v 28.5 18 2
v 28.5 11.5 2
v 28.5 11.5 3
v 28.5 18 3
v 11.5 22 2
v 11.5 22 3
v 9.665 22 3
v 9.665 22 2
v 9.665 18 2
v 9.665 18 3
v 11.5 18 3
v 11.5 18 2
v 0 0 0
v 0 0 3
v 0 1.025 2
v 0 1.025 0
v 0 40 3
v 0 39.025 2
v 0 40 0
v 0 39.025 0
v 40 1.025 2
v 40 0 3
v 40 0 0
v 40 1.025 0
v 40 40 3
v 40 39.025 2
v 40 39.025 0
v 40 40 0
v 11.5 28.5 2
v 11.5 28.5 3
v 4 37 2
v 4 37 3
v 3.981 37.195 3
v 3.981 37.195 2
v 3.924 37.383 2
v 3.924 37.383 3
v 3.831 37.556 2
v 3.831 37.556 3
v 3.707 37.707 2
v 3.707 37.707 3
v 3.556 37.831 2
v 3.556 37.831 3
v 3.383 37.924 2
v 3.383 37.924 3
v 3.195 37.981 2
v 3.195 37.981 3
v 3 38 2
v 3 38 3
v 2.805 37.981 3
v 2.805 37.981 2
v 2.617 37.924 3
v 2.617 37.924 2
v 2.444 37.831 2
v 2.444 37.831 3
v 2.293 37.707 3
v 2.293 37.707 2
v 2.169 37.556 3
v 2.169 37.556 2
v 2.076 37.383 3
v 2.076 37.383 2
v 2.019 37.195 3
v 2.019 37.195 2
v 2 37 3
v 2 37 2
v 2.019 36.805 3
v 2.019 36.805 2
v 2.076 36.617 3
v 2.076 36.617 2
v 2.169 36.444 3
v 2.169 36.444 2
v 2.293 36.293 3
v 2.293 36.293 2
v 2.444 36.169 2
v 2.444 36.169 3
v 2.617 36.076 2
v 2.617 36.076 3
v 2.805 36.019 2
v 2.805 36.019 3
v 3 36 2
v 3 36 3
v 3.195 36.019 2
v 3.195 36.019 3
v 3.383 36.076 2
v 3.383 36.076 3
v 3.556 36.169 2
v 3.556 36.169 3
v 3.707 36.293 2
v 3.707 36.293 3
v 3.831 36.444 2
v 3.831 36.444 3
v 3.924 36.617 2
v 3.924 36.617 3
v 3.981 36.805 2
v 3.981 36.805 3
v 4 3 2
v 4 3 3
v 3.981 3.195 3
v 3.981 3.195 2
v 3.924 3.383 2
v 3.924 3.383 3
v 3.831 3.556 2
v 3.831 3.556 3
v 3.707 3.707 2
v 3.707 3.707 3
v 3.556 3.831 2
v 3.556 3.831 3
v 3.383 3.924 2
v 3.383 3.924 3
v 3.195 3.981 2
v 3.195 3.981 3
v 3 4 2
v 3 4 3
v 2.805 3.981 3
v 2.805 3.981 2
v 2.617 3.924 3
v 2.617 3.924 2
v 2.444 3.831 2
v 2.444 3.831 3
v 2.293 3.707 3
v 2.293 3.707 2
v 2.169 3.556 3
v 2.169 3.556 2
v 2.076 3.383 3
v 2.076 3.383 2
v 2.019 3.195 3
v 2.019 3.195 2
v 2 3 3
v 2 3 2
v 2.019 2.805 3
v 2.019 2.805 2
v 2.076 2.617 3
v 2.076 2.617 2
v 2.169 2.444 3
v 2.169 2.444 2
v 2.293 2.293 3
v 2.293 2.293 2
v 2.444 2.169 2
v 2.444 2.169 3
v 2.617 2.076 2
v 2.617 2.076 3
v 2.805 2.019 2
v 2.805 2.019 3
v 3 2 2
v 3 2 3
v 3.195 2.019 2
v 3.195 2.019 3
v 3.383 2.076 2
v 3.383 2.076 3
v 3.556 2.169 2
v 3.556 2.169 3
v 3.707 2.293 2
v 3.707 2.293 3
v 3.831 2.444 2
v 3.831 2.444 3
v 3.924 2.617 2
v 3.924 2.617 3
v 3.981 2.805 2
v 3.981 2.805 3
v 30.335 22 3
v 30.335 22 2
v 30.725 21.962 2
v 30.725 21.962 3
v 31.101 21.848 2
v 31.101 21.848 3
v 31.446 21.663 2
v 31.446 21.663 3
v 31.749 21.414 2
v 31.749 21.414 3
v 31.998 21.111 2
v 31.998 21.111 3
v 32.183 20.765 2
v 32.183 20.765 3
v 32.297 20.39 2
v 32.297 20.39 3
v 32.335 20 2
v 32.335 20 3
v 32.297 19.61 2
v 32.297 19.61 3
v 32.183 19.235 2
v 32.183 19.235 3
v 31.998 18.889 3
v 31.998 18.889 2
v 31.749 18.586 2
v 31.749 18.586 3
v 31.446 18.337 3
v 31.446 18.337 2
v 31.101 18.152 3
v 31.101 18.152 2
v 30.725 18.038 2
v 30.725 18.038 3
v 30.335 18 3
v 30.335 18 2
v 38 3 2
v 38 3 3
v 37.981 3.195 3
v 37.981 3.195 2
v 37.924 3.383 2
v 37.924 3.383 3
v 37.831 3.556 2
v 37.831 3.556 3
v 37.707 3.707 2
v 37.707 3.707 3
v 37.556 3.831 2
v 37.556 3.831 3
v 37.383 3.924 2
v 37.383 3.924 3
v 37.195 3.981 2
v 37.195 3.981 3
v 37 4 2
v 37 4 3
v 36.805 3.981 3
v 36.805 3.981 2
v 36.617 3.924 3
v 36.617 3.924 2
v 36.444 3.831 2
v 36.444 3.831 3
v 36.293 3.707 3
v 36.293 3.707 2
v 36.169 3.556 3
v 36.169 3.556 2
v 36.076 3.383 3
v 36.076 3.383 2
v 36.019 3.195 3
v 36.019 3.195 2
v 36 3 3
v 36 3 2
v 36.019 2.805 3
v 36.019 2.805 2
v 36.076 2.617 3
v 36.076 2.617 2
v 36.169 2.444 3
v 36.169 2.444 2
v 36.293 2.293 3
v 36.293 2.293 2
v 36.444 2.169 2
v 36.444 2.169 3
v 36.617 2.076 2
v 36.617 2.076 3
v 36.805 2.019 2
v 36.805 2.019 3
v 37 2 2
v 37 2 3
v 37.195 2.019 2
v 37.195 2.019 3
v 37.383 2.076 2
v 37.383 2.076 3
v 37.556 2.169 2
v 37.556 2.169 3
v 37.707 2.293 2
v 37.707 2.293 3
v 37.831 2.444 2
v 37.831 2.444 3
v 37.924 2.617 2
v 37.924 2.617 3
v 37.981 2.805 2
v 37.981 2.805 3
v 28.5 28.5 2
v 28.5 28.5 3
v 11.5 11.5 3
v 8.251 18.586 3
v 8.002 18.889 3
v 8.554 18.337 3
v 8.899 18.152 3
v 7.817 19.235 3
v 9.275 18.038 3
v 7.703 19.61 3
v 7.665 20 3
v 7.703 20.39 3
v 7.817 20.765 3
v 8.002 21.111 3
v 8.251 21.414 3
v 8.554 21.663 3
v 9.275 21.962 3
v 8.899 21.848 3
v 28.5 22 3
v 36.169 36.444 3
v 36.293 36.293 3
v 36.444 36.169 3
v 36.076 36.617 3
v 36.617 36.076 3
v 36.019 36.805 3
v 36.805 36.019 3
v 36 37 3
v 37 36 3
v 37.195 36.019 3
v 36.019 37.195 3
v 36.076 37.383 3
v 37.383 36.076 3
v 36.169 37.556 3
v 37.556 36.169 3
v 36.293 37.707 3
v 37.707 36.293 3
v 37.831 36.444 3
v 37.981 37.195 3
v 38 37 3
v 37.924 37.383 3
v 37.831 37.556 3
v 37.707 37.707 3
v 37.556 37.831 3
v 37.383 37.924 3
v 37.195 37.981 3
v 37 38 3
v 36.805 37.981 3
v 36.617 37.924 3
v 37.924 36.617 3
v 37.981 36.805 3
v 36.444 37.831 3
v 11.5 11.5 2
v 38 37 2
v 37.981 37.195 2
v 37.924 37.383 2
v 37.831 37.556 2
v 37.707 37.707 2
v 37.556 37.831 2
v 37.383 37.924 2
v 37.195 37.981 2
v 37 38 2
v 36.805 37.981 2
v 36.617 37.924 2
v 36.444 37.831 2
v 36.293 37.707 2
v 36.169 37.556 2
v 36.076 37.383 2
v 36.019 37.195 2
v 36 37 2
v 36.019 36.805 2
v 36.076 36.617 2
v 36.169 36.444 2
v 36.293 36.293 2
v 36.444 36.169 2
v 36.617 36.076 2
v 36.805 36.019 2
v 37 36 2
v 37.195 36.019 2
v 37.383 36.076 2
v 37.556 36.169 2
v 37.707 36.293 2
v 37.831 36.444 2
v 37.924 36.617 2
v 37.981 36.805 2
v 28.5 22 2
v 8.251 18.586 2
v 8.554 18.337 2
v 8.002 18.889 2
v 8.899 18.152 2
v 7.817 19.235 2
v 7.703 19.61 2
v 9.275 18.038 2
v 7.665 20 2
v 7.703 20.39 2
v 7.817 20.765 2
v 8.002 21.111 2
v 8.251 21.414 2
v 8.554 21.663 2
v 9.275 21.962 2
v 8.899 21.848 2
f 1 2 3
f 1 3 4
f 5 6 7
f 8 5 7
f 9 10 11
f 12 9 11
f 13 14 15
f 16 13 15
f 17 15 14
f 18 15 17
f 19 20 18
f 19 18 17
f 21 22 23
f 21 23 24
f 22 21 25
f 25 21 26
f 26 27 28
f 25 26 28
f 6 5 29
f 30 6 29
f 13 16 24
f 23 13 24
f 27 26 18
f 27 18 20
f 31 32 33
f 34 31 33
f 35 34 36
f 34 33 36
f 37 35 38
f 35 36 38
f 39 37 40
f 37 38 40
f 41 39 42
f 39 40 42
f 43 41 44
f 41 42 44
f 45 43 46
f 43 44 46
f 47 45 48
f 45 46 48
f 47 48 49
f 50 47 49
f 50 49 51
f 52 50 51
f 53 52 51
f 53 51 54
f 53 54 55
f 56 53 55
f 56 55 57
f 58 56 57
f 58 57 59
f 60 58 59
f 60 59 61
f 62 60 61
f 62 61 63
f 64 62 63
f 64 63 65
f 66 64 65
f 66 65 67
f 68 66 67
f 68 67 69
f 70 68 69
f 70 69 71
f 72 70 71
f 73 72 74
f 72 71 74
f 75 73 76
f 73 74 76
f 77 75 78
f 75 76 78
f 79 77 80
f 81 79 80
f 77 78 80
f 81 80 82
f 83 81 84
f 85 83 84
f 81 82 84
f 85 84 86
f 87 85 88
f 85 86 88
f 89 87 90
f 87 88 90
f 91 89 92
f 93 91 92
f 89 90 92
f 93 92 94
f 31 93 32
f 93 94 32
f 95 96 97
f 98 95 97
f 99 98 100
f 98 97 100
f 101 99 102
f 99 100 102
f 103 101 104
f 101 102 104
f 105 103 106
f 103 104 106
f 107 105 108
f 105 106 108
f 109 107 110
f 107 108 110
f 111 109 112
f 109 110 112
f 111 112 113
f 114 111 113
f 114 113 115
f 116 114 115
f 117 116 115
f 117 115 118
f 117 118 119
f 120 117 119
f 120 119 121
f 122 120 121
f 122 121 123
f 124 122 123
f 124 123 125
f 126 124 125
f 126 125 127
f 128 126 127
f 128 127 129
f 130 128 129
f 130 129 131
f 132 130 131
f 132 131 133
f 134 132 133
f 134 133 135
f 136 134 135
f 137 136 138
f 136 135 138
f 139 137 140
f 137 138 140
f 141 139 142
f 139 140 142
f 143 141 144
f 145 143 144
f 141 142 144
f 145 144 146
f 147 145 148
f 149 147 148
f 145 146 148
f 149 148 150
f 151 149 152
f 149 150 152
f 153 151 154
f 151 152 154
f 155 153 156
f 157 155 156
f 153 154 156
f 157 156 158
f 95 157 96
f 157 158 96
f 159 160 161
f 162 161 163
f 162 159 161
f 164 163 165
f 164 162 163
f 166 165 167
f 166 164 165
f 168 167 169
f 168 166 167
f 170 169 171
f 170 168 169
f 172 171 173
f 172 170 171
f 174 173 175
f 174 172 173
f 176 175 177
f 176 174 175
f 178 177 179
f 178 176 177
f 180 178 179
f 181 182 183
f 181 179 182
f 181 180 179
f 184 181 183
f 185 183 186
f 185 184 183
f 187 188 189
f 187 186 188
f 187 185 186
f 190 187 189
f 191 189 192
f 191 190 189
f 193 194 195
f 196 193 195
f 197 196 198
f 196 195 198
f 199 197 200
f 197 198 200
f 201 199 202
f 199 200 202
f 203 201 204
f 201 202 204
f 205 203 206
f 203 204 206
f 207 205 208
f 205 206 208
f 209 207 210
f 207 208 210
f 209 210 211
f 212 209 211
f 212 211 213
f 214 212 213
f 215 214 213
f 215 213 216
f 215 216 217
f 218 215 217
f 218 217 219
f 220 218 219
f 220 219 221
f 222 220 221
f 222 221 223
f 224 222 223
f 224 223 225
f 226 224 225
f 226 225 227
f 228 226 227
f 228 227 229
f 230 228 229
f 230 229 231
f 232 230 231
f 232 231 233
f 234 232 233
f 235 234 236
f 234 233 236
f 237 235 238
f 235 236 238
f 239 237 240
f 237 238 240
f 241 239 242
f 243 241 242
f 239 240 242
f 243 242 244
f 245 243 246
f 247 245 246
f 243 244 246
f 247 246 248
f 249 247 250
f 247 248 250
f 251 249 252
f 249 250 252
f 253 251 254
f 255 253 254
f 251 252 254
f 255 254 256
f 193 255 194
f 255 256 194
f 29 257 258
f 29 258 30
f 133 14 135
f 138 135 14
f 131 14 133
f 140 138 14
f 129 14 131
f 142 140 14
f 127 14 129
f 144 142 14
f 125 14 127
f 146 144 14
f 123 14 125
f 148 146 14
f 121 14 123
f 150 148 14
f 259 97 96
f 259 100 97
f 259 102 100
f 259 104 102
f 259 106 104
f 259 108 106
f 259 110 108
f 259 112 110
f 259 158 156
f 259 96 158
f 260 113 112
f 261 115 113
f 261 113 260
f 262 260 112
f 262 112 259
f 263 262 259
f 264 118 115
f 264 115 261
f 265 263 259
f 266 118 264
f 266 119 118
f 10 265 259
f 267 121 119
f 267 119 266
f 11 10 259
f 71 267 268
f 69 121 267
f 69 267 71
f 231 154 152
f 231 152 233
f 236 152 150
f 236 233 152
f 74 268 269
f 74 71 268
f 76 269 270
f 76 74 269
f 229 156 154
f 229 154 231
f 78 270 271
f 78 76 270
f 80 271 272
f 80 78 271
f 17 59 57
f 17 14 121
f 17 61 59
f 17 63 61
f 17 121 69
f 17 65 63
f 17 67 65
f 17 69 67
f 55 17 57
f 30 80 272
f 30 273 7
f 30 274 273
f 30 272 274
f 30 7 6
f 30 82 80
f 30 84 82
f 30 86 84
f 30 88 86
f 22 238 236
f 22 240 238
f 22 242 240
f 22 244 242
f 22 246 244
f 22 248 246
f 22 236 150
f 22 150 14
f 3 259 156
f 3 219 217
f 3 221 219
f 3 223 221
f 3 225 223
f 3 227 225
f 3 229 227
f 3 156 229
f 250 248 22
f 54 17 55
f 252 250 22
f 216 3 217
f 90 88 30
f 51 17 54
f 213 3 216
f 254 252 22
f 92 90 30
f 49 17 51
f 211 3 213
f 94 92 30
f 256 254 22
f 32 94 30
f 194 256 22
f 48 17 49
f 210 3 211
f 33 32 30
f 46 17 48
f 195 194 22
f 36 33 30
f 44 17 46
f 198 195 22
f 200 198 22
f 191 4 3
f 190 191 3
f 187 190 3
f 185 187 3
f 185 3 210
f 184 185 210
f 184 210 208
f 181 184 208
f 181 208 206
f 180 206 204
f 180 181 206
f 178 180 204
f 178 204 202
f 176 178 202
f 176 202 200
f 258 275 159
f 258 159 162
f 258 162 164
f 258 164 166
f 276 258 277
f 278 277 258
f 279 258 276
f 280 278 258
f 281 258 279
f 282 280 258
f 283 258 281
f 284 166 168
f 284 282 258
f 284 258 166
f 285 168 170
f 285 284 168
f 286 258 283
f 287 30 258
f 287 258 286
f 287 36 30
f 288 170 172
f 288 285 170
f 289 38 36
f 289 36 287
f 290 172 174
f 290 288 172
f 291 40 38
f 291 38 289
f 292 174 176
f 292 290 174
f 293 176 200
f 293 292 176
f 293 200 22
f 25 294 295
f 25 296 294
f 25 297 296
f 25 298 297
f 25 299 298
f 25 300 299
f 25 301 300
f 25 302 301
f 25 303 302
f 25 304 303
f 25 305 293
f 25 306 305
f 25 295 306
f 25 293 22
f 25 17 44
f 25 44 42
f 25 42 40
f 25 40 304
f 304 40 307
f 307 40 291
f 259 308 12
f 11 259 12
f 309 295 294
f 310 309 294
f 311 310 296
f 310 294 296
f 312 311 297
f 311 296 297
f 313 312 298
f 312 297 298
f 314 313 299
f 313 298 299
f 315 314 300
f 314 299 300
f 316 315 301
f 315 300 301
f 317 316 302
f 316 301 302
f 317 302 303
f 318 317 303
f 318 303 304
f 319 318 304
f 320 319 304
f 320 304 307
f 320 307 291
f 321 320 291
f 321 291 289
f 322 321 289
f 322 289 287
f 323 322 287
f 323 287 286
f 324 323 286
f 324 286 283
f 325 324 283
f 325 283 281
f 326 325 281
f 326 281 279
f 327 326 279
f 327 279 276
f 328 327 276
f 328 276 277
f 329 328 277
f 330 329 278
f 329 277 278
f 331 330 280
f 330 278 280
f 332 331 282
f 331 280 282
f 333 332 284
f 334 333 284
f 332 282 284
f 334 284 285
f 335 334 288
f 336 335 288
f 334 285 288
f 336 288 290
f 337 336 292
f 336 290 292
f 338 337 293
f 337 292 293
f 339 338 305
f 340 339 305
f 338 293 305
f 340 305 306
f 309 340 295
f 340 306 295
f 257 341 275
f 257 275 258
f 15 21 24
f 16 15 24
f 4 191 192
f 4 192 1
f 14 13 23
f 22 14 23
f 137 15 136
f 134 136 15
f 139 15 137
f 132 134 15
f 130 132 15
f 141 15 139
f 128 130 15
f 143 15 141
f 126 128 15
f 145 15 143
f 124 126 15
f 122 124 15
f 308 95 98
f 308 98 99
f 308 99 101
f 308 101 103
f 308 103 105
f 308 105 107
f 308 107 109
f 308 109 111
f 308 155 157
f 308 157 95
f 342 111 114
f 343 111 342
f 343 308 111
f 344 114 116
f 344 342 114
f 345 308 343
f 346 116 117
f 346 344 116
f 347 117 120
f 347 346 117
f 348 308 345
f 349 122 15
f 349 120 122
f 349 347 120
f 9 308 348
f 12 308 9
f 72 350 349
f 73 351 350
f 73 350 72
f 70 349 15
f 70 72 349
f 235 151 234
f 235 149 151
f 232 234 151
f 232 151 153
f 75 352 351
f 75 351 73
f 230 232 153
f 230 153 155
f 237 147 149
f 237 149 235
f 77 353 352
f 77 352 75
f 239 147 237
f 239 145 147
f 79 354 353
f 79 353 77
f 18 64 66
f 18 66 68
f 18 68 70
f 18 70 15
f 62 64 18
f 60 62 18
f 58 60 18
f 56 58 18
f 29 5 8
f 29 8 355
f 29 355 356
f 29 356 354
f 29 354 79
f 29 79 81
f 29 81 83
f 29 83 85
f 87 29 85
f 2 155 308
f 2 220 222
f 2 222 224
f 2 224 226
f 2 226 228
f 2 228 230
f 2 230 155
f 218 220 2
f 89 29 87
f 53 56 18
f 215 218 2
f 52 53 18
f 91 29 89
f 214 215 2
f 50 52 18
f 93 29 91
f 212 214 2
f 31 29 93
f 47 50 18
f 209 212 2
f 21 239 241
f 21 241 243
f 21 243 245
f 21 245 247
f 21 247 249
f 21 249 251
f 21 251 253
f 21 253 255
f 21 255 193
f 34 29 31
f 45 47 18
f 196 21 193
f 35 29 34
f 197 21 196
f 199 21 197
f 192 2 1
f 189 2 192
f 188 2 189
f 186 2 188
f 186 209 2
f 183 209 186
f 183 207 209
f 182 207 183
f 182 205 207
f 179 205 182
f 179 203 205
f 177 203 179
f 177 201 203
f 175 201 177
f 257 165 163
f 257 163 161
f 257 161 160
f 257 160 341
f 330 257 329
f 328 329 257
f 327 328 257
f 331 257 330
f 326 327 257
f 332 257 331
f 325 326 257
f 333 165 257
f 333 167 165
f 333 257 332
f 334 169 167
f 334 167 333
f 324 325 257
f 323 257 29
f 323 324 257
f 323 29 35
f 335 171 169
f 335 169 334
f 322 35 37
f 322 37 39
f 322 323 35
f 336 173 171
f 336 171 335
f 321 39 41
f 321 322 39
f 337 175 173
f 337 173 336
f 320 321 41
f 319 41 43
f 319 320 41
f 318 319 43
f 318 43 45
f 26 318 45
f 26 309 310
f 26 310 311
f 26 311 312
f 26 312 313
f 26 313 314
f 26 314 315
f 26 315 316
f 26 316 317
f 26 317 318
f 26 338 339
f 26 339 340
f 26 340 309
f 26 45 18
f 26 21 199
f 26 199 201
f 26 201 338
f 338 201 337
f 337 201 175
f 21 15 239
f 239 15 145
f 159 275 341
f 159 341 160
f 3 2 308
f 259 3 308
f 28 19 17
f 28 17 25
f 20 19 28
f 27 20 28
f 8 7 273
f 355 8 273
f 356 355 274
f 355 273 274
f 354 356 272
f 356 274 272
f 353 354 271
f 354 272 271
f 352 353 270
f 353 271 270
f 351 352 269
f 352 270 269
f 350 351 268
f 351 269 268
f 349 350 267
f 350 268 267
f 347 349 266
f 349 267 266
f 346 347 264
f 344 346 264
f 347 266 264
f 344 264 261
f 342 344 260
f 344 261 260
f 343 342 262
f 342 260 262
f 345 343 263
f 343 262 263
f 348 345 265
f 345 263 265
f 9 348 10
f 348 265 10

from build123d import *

# Parameters (mm, degrees)
SKETCH1_W           = 40
SKETCH1_H           = 40
BOSS_EXTRUDE1_DEPTH = 3
SKETCH2_R           = 1
CUT_EXTRUDE1_DEPTH  = 10
SKETCH3_W           = 17
SKETCH3_H           = 17
CUT_EXTRUDE3_DEPTH  = 10
SKETCH4_W           = 2
SKETCH4_H           = 38
CUT_EXTRUDE4_DEPTH  = 41
CUT_EXTRUDE5_DEPTH  = 4


with BuildPart() as part:
    # Sketch1 → Boss-Extrude1 (new body)
    with BuildSketch(Plane.XY):
        with Locations((20, 20)):
            Rectangle(SKETCH1_W, SKETCH1_H)
    extrude(amount=BOSS_EXTRUDE1_DEPTH)

    # Sketch2 → Cut-Extrude1 (cut)
    with BuildSketch(Plane.XY.offset(3)):
        with Locations((3, 37)):
            Circle(SKETCH2_R)
        with Locations((3, 3)):
            Circle(SKETCH2_R)
        with Locations((37, 37)):
            Circle(SKETCH2_R)
        with Locations((37, 3)):
            Circle(SKETCH2_R)
    extrude(amount=-CUT_EXTRUDE1_DEPTH, mode=Mode.SUBTRACT)

    # Sketch3 → Cut-Extrude3 (cut)
    with BuildSketch(Plane(origin=(0, 0, 0), x_dir=(-1, 0, 0), z_dir=(0, 0, -1))):
        with Locations((-20, 20)):
            Rectangle(SKETCH3_W, SKETCH3_H)
    extrude(amount=-CUT_EXTRUDE3_DEPTH, mode=Mode.SUBTRACT)

    # Sketch4 → Cut-Extrude4 (cut, through all)
    with BuildSketch(Plane(origin=(40, 0, 0), x_dir=(0, 0, -1), z_dir=(1, 0, 0))):
        with Locations((-1, 20.024894978)):
            Rectangle(SKETCH4_W, SKETCH4_H)
    extrude(amount=-CUT_EXTRUDE4_DEPTH, mode=Mode.SUBTRACT)

    # Sketch7 → Cut-Extrude5 (cut, through all)
    with BuildSketch(Plane.XY.offset(3)):
        with BuildLine():
            Line((11.5, 22), (9.66485435, 22))
            ThreePointArc((9.66485435, 22), (7.66485435, 20), (9.66485435, 18))
            Line((9.66485435, 18), (11.5, 18))
            Line((11.5, 18), (11.5, 22))
        make_face()
        with BuildLine():
            Line((28.5, 22), (30.33514565, 22))
            ThreePointArc((30.33514565, 22), (32.33514565, 20), (30.33514565, 18))
            Line((30.33514565, 18), (28.5, 18))
            Line((28.5, 18), (28.5, 22))
        make_face()
    extrude(amount=-CUT_EXTRUDE5_DEPTH, mode=Mode.SUBTRACT)


solid = part.part
